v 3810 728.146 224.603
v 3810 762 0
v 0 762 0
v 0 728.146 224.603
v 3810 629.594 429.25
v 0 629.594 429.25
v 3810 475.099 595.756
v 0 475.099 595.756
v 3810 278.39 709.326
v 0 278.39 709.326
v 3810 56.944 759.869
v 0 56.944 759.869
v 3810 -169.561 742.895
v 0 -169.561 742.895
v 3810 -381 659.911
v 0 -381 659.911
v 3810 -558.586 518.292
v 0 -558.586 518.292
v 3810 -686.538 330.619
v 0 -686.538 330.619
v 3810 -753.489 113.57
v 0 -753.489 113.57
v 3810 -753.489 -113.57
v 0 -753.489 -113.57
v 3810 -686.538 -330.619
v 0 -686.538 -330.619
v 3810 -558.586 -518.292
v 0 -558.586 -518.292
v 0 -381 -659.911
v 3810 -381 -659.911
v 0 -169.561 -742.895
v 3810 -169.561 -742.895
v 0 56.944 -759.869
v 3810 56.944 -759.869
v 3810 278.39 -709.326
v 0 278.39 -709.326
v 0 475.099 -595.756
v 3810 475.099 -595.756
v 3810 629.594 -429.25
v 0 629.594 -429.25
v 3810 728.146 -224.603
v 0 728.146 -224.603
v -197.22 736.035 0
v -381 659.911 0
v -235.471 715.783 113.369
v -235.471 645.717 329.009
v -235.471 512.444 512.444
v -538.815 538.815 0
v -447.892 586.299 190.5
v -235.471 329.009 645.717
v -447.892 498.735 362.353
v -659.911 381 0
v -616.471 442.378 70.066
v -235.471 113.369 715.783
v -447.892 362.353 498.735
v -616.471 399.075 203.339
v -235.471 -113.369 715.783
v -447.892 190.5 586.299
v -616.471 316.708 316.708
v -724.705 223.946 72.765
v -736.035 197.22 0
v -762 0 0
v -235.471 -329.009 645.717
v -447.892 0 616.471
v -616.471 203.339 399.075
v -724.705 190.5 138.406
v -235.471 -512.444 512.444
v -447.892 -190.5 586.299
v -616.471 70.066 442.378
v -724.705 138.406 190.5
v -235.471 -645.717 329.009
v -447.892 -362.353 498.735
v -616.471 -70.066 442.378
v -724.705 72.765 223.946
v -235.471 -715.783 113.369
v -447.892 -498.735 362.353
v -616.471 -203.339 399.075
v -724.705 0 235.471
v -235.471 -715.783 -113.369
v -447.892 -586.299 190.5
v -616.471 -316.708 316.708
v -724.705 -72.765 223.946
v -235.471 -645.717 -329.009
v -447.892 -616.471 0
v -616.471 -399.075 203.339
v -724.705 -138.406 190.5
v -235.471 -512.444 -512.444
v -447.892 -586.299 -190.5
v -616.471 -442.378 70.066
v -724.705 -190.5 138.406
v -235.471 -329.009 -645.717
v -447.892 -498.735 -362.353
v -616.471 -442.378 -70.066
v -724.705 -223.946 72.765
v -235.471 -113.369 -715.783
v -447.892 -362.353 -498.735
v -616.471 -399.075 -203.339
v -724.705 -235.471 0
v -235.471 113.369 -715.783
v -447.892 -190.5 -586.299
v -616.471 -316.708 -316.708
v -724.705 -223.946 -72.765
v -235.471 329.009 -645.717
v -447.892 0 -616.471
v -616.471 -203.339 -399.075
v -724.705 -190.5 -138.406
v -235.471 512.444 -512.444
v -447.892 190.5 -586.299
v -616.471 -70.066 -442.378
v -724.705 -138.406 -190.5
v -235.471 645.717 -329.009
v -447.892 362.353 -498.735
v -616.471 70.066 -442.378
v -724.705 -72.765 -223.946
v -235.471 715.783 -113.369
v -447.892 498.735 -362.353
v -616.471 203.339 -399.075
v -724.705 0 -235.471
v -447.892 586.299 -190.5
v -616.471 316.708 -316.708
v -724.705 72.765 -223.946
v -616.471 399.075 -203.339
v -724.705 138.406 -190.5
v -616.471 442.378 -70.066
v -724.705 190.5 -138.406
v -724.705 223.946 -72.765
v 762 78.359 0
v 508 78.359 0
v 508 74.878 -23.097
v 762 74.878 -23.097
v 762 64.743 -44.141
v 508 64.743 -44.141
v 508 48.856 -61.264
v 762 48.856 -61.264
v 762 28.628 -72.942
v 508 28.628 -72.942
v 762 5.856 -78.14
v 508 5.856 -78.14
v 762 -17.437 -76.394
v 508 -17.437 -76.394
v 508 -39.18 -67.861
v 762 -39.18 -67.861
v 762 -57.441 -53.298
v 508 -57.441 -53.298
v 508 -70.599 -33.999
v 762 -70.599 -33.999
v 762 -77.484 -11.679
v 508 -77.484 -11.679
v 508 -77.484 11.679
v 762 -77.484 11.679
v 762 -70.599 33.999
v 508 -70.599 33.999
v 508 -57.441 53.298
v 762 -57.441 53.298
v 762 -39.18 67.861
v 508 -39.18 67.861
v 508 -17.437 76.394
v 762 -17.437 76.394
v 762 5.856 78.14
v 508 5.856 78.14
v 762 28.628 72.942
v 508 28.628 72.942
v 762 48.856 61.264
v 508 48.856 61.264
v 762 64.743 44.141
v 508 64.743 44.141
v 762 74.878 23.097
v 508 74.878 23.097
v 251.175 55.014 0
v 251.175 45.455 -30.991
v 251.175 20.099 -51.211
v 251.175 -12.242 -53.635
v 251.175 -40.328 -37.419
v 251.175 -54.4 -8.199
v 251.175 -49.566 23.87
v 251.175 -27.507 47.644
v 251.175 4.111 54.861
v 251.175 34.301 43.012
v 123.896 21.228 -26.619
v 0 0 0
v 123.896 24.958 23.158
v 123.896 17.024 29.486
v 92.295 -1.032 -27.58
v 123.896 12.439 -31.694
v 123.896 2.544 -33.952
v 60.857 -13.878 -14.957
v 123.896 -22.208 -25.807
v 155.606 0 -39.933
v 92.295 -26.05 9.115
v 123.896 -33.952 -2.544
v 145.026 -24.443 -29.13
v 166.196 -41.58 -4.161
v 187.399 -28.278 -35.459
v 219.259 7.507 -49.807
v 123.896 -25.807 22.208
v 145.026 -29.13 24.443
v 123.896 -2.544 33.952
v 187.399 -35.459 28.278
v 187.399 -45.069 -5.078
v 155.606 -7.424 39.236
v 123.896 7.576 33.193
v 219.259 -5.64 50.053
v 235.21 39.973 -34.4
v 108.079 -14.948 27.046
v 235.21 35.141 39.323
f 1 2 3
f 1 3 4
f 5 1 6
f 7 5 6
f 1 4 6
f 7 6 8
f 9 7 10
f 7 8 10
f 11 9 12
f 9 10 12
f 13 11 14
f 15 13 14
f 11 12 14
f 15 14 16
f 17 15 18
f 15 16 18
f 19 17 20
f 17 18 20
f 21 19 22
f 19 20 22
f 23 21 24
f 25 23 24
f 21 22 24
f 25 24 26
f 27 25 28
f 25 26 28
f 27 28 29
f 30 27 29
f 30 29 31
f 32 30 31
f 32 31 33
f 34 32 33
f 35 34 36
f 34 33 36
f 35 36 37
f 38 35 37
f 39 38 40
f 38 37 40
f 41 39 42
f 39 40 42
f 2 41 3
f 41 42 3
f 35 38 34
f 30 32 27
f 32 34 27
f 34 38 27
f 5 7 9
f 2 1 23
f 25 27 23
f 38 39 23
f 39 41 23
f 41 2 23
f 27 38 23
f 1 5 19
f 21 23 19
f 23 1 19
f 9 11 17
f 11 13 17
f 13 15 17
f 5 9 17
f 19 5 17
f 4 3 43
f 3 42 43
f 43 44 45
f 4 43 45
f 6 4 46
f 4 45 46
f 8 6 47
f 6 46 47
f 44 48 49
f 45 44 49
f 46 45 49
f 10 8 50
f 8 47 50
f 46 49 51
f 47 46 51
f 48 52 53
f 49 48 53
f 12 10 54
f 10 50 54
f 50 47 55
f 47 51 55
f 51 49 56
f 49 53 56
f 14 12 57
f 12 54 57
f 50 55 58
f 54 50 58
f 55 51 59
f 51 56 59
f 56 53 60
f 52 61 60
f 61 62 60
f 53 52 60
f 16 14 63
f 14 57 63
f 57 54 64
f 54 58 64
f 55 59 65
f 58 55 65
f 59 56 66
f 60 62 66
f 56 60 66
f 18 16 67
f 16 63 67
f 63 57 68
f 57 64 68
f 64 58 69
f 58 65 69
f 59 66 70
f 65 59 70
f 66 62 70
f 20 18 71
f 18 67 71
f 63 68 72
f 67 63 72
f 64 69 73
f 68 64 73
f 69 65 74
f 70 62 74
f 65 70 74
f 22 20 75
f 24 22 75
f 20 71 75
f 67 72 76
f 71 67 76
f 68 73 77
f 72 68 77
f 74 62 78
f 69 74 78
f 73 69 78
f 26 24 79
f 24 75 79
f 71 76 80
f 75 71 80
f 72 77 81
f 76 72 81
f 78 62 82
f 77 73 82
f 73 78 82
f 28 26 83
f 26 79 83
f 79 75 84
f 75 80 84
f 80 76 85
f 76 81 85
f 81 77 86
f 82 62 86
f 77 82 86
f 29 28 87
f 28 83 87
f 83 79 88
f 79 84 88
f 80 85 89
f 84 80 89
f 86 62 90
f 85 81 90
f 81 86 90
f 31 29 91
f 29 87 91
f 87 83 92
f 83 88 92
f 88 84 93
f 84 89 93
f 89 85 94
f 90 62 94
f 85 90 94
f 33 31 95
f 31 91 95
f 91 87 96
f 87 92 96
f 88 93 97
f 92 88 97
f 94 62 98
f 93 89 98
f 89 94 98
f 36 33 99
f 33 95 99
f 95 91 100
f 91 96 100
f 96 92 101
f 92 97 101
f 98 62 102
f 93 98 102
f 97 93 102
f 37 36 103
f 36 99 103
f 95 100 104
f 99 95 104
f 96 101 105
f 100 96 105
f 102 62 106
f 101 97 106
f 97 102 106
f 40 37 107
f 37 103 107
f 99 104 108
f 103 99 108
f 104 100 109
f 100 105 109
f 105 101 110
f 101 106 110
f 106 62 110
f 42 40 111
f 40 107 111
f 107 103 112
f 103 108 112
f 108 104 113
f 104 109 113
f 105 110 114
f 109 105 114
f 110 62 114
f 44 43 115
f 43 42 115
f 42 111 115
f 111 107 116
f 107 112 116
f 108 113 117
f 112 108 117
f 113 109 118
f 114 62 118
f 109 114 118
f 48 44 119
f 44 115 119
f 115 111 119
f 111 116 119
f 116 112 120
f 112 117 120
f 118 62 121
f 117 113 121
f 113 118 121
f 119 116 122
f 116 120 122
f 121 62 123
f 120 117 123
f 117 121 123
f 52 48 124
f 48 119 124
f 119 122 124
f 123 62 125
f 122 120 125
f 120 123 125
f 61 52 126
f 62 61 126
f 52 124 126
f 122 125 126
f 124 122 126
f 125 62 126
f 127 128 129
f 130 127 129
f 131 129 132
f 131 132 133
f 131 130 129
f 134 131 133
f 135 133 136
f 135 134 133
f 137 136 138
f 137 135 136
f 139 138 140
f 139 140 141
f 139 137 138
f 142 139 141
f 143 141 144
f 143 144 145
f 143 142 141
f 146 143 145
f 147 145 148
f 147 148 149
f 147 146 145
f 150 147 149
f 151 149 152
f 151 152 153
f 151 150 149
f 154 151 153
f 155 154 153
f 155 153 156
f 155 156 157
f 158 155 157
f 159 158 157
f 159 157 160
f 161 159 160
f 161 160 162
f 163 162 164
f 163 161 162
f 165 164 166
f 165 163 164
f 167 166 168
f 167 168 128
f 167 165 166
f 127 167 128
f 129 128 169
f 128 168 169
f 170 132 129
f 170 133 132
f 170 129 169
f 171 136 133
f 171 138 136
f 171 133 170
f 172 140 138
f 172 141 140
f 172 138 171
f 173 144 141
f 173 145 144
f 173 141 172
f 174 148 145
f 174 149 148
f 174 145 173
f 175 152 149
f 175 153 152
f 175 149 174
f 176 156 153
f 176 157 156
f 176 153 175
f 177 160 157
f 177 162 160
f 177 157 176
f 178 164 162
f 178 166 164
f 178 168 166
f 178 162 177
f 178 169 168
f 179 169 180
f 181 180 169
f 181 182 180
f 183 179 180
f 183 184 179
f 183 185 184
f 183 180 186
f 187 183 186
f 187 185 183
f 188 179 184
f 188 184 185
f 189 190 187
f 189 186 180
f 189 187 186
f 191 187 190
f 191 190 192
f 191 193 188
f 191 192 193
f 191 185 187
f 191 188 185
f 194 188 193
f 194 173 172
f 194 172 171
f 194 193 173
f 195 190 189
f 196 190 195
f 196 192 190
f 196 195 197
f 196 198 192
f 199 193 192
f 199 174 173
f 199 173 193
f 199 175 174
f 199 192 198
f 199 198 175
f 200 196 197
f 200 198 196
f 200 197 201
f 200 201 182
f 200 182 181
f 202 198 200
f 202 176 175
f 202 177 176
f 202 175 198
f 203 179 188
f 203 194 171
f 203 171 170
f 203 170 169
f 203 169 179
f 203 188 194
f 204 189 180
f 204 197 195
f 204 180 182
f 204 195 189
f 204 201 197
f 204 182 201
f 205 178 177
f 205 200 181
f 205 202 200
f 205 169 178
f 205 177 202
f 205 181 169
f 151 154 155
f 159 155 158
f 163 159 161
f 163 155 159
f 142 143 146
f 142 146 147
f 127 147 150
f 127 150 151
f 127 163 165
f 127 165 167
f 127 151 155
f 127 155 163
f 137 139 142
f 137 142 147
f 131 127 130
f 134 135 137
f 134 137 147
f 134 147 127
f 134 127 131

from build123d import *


with BuildPart() as part:
    # Sketch8 → Revolve8 (revolve)
    with BuildSketch(Plane.XY):
        with BuildLine():
            Line((508, 0), (0, 0))
            add(Edge.make_bspline(
                [(0, 0), (0.002822011, 0.011220682), (0.01010376, 0.033028979), (0.031502321, 0.074017024), (0.069784833, 0.131646678), (0.119222388, 0.195375451), (0.189812425, 0.276067496), (0.274835356, 0.363880791), (0.401947452, 0.484306453), (0.602624186, 0.656685654), (0.914446886, 0.898448081), (1.444794417, 1.267055392), (2.342189308, 1.821854316), (3.926219982, 2.68636524), (6.792153336, 4.05339861), (11.891147147, 6.162529219), (20.431057711, 9.216107653), (31.891623295, 12.776951203), (45.625686568, 16.59500746), (64.715206078, 21.439103902), (87.842839522, 26.755548696), (115.260857413, 32.475768916), (146.98211669, 38.485522007), (178.789638074, 44.017933119), (210.666331669, 49.135593448), (242.60094075, 53.877496918), (274.585932559, 58.26635678), (306.615943821, 62.313330004), (338.687218842, 66.019317565), (370.797101622, 69.374815155), (402.943853119, 72.357821551), (431.103668314, 74.606208089), (455.262955994, 76.229190957), (474.443672775, 77.278006717), (487.103143355, 77.83586579), (497.267203511, 78.174386426), (503.399758723, 78.310011701), (506.466506539, 78.353386553), (508, 78.359)],
                knots=[0, 0, 0, 0, 0, 8.9262e-05, 0.000178524, 0.000357048, 0.000535573, 0.000714097, 0.001009141, 0.001304186, 0.001892408, 0.002763912, 0.00406622, 0.006308364, 0.010066681, 0.016745451, 0.028667746, 0.049062689, 0.080343506, 0.109747473, 0.13915144, 0.201713099, 0.264274768, 0.326836438, 0.389398105, 0.451959776, 0.514521446, 0.577083113, 0.639644785, 0.702206453, 0.764768123, 0.827329793, 0.889891462, 0.921172297, 0.952453131, 0.976226566, 0.988113283, 1, 1, 1, 1, 1], degree=4))
            Line((508, 78.359), (762, 78.359))
            Line((762, 78.359), (762, 0))
            Line((762, 0), (508, 0))
        make_face()
    revolve(axis=Axis((508, 0, 0), (-1, 0, 0)))


with BuildPart() as body_2:
    # Sketch9 → Revolve9 (revolve)
    with BuildSketch(Plane.XY):
        with BuildLine():
            Line((-762, 0), (3809.999961401, 0))
            Line((3809.999961401, 0), (3809.999961401, 762))
            Line((3809.999961401, 762), (3.8599e-05, 762))
            ThreePointArc((3.8599e-05, 762), (-538.815353617, 538.815380911), (-762, 0))
        make_face()
    revolve(axis=Axis((-762, 0, 0), (1, 0, 0)))

    # Combine1: cut part
    add(part.part, mode=Mode.SUBTRACT)


solid = body_2.part
